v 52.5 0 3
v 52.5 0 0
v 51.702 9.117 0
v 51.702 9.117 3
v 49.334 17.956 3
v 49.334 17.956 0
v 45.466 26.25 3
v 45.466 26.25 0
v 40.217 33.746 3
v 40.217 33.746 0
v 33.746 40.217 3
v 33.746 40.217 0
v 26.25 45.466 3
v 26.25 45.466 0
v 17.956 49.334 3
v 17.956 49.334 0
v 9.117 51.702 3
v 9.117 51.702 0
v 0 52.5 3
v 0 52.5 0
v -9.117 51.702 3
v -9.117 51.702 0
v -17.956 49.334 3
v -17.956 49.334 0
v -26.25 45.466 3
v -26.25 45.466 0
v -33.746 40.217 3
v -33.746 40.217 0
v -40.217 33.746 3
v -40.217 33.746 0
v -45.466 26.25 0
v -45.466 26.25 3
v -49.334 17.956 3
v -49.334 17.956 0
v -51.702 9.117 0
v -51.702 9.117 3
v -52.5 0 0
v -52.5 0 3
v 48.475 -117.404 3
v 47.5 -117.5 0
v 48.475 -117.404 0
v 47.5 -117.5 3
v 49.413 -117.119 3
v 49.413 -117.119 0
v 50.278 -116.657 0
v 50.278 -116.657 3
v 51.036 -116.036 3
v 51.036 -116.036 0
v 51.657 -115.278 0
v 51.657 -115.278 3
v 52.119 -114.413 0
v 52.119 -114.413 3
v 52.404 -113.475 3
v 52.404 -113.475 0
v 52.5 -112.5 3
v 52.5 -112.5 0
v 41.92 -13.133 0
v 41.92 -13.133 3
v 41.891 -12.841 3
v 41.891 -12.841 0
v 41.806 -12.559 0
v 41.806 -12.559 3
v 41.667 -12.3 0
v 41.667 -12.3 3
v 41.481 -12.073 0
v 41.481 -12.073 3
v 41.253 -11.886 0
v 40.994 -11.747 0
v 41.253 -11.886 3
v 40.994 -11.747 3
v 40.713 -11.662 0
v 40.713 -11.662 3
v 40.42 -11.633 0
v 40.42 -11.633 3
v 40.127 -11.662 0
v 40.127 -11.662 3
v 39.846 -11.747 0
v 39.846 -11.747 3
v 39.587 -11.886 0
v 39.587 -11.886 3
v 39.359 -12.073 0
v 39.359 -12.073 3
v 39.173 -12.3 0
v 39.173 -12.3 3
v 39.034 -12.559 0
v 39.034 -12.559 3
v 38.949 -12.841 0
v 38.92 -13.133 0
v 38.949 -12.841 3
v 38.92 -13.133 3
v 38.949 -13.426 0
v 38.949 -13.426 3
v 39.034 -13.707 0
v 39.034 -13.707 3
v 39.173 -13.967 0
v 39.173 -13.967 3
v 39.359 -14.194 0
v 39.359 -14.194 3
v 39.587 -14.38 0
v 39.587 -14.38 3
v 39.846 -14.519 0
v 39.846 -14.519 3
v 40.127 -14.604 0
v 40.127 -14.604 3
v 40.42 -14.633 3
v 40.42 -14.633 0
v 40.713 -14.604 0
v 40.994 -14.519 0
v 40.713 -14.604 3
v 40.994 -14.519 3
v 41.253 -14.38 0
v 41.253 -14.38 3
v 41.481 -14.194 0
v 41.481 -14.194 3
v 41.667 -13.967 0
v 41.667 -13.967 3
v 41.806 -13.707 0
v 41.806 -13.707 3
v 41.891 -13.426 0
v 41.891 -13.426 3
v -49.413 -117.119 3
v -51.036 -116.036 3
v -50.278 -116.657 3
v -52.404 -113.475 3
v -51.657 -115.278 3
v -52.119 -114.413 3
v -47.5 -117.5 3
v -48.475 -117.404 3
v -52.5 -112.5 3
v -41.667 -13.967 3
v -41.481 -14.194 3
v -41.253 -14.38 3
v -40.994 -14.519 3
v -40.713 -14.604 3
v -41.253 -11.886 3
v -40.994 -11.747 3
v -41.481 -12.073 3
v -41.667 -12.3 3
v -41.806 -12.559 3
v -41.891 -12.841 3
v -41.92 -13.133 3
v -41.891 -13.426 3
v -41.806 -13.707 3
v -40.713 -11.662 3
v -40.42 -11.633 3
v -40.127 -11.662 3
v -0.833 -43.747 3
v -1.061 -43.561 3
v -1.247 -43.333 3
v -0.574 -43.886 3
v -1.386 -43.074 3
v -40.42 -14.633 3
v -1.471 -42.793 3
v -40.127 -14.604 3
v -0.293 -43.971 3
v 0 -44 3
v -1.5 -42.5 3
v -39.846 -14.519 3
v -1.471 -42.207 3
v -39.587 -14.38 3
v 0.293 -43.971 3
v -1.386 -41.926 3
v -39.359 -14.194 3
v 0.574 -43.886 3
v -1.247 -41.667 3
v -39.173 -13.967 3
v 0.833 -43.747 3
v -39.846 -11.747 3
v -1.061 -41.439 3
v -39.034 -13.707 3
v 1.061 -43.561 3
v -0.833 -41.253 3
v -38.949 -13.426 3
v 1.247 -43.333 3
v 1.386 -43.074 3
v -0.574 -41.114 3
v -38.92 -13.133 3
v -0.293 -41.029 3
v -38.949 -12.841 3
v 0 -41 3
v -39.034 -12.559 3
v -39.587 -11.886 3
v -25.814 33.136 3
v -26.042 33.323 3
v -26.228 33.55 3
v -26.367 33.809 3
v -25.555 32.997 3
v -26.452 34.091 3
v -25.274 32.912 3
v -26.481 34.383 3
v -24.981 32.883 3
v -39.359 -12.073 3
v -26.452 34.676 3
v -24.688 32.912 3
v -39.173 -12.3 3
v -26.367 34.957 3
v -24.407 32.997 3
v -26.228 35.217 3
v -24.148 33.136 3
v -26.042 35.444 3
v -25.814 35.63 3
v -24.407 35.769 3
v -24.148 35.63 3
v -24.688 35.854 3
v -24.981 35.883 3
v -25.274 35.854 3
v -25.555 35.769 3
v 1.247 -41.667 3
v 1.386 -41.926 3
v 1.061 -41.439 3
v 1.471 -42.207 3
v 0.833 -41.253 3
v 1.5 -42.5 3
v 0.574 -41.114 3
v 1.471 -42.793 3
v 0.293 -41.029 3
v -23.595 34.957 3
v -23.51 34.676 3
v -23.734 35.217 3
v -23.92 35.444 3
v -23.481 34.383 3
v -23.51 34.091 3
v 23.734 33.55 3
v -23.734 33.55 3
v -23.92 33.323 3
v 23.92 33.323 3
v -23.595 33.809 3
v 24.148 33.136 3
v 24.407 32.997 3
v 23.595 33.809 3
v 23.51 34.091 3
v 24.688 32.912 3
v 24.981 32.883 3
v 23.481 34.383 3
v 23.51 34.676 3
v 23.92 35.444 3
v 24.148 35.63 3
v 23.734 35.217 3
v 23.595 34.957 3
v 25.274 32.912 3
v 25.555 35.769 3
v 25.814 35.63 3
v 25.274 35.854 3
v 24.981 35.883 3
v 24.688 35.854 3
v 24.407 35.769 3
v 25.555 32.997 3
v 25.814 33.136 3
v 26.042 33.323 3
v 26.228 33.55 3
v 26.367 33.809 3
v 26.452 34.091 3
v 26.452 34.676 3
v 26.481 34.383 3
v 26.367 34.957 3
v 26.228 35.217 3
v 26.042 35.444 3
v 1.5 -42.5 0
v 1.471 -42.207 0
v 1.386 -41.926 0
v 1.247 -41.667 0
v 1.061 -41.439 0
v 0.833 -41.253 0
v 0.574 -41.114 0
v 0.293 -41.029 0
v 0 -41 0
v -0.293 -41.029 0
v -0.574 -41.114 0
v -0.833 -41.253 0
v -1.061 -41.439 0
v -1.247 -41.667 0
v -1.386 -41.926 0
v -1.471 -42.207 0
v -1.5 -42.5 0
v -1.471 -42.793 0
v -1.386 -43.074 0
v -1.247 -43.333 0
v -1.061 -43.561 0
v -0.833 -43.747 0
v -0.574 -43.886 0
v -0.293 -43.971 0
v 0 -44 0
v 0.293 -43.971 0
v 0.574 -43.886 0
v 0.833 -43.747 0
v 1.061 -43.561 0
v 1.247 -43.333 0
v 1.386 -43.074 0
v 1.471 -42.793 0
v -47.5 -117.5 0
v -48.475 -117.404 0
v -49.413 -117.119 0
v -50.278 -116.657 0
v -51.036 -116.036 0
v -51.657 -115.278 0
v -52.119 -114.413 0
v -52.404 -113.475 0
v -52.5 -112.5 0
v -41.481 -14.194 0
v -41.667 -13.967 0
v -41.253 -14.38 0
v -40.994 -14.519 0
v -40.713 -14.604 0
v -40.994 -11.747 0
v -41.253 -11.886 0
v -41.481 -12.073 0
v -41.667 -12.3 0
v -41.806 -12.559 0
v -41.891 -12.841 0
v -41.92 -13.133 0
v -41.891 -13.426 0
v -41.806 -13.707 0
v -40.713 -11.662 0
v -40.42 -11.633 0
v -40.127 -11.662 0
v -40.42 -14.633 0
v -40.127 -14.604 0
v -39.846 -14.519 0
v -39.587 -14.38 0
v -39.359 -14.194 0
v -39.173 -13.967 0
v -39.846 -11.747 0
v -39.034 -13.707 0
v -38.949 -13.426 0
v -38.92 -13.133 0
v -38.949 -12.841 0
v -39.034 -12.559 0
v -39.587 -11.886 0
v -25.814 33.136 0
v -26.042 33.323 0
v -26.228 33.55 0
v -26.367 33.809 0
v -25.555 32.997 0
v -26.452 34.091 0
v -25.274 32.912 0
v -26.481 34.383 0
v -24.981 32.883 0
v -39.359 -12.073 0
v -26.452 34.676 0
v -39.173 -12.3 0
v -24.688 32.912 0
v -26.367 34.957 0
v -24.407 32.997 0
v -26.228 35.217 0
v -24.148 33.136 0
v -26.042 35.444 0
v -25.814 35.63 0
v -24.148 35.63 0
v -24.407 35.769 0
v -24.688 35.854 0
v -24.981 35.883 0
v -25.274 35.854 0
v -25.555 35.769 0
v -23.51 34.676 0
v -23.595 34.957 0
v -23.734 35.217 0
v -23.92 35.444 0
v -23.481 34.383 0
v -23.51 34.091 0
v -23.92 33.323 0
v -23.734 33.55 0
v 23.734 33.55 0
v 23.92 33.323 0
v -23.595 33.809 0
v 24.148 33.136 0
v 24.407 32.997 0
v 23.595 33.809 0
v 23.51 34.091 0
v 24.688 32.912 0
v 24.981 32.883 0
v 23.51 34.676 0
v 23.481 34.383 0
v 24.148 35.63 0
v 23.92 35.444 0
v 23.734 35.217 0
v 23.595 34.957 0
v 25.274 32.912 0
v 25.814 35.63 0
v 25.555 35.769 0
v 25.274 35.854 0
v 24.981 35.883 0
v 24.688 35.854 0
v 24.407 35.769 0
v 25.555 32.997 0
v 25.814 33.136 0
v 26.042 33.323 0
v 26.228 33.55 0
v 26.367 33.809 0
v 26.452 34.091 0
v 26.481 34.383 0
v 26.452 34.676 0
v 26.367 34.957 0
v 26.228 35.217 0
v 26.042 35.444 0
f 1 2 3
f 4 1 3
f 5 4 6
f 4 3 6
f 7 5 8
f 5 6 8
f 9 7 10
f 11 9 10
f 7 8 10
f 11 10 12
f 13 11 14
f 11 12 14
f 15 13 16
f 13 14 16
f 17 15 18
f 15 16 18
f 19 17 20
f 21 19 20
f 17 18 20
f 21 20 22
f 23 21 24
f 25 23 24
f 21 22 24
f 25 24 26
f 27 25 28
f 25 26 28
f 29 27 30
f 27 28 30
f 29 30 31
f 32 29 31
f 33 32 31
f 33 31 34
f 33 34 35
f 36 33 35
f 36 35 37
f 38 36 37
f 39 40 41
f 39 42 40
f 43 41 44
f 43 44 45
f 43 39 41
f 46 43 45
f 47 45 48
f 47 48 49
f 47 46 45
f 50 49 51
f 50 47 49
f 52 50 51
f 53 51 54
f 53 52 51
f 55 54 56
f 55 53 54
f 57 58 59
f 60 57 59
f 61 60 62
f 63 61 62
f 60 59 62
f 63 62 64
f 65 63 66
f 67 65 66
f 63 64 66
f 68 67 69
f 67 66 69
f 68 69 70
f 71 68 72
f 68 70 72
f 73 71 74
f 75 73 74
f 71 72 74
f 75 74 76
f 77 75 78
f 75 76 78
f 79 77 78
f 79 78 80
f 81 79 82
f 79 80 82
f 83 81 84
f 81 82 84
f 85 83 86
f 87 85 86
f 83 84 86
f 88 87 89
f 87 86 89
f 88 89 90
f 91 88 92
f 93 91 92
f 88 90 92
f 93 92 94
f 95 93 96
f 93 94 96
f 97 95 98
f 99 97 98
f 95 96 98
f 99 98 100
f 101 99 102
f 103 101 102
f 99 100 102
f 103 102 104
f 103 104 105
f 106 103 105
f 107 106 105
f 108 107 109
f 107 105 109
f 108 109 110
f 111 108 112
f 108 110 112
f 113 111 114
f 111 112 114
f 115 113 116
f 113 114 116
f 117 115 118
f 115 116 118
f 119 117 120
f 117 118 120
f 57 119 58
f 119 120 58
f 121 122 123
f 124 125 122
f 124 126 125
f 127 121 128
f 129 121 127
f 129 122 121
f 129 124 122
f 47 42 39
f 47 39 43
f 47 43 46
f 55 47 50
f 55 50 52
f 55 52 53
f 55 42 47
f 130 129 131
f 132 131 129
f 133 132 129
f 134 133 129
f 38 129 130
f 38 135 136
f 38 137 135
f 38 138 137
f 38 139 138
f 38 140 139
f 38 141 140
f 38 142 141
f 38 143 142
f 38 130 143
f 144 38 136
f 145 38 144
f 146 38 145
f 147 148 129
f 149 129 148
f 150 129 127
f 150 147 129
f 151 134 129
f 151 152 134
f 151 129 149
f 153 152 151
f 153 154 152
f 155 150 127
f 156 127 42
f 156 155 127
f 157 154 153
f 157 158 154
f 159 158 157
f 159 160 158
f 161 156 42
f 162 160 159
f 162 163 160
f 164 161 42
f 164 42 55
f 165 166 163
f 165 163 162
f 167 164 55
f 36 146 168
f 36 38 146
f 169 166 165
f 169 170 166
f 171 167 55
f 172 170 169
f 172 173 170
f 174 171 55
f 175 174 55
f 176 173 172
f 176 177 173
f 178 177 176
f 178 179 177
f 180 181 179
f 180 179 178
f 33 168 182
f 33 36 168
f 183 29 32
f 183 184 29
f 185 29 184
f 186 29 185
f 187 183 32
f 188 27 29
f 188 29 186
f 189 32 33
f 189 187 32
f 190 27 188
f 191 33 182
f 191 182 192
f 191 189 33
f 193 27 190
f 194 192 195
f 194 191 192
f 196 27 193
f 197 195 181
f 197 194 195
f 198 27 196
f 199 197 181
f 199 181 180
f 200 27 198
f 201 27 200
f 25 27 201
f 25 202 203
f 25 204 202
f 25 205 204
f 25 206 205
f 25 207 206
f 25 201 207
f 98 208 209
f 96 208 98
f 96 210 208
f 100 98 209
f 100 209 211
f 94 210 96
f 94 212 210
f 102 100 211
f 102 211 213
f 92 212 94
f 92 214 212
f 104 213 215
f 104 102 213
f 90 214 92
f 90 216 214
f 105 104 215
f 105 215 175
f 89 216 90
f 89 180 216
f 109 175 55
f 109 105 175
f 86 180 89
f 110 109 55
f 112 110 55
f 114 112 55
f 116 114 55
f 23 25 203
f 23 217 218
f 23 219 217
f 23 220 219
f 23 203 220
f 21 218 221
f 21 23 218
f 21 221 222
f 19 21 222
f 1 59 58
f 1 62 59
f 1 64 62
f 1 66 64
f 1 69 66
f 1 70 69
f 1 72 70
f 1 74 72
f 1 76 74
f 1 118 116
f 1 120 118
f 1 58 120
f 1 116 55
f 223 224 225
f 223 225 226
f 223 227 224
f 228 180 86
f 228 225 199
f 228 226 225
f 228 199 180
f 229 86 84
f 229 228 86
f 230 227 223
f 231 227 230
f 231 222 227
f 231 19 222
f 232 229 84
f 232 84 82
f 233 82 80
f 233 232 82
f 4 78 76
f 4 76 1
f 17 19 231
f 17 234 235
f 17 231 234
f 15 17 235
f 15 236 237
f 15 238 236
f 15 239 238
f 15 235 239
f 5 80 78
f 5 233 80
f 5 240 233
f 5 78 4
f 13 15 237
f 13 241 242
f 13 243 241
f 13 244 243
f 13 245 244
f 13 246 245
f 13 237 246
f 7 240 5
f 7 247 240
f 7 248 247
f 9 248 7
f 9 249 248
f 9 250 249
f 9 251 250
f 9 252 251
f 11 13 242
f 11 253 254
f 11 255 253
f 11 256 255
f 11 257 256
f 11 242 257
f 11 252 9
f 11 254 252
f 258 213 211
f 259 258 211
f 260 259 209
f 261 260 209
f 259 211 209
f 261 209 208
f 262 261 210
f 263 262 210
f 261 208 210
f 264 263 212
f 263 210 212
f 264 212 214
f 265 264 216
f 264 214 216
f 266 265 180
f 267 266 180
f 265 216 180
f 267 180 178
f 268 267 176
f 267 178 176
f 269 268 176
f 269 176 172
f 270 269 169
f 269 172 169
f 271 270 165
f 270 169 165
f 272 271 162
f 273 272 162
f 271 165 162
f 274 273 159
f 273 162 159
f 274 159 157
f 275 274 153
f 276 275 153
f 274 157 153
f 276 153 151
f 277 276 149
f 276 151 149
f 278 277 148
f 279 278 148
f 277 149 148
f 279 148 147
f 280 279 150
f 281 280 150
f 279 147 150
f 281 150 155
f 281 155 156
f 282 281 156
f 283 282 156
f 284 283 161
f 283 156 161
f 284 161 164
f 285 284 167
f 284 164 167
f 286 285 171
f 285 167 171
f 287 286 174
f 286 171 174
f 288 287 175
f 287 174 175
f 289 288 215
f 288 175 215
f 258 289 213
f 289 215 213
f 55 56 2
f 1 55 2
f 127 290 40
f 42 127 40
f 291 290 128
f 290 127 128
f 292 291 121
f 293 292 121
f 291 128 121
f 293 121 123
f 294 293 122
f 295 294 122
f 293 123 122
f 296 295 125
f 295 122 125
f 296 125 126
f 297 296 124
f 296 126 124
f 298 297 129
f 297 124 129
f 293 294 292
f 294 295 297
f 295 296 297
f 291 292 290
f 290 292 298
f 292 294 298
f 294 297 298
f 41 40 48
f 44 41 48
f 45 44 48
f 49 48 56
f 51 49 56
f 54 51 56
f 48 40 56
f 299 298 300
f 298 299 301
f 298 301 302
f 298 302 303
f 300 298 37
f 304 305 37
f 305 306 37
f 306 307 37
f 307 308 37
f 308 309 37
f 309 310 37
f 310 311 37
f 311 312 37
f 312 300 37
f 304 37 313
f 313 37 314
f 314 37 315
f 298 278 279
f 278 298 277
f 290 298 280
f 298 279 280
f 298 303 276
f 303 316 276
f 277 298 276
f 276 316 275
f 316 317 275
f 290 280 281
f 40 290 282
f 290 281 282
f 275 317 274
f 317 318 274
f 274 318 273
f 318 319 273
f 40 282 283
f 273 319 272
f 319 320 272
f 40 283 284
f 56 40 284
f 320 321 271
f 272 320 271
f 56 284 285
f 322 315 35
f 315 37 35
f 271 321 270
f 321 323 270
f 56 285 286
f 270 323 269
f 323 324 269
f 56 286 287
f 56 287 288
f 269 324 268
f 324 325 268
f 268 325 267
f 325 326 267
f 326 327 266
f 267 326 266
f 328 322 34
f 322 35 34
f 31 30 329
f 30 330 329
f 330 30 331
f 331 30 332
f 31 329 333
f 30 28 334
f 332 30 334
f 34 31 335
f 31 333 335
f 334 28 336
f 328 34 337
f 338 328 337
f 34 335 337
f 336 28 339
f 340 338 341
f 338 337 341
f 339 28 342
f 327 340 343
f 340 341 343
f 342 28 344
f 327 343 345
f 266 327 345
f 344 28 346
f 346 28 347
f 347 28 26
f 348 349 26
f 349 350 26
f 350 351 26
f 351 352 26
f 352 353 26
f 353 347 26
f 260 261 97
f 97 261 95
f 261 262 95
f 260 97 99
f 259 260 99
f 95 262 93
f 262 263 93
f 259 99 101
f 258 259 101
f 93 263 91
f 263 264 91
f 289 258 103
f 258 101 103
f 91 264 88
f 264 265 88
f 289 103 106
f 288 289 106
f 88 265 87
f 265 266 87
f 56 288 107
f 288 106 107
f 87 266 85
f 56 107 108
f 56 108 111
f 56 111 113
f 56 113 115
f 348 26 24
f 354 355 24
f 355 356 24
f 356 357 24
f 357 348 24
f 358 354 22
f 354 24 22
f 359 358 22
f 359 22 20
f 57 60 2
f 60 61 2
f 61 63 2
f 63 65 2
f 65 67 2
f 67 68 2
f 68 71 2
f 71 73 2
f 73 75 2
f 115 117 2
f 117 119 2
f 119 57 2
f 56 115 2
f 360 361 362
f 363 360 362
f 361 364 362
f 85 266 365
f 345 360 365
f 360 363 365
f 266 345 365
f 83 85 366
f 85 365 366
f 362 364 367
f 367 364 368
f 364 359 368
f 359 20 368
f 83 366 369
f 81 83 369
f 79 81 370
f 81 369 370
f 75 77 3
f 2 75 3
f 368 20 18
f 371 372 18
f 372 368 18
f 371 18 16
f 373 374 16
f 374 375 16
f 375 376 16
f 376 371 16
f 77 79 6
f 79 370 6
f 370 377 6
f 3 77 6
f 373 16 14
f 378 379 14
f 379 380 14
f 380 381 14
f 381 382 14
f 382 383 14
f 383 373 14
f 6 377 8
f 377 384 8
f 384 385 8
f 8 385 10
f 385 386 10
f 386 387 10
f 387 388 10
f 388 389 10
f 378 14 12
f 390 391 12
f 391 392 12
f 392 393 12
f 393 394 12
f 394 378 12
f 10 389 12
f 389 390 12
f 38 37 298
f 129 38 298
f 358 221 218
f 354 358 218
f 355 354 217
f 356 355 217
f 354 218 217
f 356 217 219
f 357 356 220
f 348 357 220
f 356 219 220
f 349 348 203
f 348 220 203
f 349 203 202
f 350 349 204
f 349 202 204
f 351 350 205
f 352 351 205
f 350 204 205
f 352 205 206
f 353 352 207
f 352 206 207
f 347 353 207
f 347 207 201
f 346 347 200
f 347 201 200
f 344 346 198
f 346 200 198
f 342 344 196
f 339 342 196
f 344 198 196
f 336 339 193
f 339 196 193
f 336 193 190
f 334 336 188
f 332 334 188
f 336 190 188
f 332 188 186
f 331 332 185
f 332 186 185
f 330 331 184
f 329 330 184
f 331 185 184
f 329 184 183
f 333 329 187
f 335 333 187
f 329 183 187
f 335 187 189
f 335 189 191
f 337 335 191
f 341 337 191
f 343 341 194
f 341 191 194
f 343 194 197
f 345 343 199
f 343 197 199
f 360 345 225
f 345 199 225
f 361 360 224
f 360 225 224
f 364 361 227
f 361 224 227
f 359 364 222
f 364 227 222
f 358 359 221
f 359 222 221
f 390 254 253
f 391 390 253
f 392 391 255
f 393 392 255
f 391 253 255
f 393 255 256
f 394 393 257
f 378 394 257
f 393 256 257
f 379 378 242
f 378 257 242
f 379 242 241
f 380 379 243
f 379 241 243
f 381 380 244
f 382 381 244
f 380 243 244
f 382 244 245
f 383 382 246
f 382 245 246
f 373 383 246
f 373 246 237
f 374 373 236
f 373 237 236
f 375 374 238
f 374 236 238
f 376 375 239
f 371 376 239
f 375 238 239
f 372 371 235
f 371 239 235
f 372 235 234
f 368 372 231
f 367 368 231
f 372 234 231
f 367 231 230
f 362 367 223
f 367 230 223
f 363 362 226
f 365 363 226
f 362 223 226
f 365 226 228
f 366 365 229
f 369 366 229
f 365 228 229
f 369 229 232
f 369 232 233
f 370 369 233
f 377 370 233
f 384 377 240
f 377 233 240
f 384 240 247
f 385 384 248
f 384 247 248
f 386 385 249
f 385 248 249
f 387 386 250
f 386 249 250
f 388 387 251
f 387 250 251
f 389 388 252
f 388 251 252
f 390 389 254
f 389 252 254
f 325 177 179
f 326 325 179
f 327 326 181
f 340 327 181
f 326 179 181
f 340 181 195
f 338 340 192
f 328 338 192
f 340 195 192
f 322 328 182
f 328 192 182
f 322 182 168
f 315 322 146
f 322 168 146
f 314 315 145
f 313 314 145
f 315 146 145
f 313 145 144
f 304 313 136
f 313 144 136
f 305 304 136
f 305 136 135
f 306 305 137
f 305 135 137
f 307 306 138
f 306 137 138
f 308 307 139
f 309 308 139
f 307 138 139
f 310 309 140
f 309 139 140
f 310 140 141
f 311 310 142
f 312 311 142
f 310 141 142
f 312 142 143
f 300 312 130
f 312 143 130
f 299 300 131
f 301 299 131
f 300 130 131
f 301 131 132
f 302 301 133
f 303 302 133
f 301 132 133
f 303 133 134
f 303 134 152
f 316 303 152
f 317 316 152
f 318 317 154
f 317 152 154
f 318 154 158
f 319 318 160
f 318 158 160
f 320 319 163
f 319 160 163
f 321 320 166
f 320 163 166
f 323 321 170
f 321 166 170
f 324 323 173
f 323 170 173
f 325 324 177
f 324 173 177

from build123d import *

# Parameters (mm, degrees)
SALIENTE_EXTRUIR1_DEPTH = 3
REDONDEO1_R             = 5
CROQUIS2_R              = 1.5
CORTAR_EXTRUIR1_DEPTH   = 3


with BuildPart() as part:
    # Croquis1 → Saliente-Extruir1 (new body)
    with BuildSketch(Plane.XY):
        with BuildLine():
            ThreePointArc((52.5, 0), (0, -52.5), (-52.5, 0))
            Line((-52.5, 0), (-52.5, -117.5))
            Line((-52.5, -117.5), (52.5, -117.5))
            Line((52.5, -117.5), (52.5, 0))
        make_face()
        with BuildLine():
            ThreePointArc((52.5, 0), (0, 52.5), (-52.5, 0))
            Line((-52.5, 0), (52.5, 0))
        make_face()
        with BuildLine():
            Line((52.5, 0), (-52.5, 0))
            ThreePointArc((-52.5, 0), (0, -52.5), (52.5, 0))
        make_face()
    extrude(amount=SALIENTE_EXTRUIR1_DEPTH)

    # Redondeo1
    redondeo1_edges = [part.edges().sort_by_distance(p)[0] for p in [
        (52.5, -117.5, 1.5),
        (-52.5, -117.5, 1.5),
    ]]
    fillet(redondeo1_edges, radius=REDONDEO1_R)

    # Croquis2 → Cortar-Extruir1 (cut)
    with BuildSketch(Plane.XY.offset(3)):
        with Locations((0, -42.5)):
            Circle(CROQUIS2_R)
        with Locations((-40.419901943, -13.133222261)):
            Circle(CROQUIS2_R)
        with Locations((-24.980873222, 34.383222261)):
            Circle(CROQUIS2_R)
        with Locations((24.980873222, 34.383222261)):
            Circle(CROQUIS2_R)
        with Locations((40.419901943, -13.133222261)):
            Circle(CROQUIS2_R)
    extrude(amount=-CORTAR_EXTRUIR1_DEPTH, mode=Mode.SUBTRACT)


solid = part.part
